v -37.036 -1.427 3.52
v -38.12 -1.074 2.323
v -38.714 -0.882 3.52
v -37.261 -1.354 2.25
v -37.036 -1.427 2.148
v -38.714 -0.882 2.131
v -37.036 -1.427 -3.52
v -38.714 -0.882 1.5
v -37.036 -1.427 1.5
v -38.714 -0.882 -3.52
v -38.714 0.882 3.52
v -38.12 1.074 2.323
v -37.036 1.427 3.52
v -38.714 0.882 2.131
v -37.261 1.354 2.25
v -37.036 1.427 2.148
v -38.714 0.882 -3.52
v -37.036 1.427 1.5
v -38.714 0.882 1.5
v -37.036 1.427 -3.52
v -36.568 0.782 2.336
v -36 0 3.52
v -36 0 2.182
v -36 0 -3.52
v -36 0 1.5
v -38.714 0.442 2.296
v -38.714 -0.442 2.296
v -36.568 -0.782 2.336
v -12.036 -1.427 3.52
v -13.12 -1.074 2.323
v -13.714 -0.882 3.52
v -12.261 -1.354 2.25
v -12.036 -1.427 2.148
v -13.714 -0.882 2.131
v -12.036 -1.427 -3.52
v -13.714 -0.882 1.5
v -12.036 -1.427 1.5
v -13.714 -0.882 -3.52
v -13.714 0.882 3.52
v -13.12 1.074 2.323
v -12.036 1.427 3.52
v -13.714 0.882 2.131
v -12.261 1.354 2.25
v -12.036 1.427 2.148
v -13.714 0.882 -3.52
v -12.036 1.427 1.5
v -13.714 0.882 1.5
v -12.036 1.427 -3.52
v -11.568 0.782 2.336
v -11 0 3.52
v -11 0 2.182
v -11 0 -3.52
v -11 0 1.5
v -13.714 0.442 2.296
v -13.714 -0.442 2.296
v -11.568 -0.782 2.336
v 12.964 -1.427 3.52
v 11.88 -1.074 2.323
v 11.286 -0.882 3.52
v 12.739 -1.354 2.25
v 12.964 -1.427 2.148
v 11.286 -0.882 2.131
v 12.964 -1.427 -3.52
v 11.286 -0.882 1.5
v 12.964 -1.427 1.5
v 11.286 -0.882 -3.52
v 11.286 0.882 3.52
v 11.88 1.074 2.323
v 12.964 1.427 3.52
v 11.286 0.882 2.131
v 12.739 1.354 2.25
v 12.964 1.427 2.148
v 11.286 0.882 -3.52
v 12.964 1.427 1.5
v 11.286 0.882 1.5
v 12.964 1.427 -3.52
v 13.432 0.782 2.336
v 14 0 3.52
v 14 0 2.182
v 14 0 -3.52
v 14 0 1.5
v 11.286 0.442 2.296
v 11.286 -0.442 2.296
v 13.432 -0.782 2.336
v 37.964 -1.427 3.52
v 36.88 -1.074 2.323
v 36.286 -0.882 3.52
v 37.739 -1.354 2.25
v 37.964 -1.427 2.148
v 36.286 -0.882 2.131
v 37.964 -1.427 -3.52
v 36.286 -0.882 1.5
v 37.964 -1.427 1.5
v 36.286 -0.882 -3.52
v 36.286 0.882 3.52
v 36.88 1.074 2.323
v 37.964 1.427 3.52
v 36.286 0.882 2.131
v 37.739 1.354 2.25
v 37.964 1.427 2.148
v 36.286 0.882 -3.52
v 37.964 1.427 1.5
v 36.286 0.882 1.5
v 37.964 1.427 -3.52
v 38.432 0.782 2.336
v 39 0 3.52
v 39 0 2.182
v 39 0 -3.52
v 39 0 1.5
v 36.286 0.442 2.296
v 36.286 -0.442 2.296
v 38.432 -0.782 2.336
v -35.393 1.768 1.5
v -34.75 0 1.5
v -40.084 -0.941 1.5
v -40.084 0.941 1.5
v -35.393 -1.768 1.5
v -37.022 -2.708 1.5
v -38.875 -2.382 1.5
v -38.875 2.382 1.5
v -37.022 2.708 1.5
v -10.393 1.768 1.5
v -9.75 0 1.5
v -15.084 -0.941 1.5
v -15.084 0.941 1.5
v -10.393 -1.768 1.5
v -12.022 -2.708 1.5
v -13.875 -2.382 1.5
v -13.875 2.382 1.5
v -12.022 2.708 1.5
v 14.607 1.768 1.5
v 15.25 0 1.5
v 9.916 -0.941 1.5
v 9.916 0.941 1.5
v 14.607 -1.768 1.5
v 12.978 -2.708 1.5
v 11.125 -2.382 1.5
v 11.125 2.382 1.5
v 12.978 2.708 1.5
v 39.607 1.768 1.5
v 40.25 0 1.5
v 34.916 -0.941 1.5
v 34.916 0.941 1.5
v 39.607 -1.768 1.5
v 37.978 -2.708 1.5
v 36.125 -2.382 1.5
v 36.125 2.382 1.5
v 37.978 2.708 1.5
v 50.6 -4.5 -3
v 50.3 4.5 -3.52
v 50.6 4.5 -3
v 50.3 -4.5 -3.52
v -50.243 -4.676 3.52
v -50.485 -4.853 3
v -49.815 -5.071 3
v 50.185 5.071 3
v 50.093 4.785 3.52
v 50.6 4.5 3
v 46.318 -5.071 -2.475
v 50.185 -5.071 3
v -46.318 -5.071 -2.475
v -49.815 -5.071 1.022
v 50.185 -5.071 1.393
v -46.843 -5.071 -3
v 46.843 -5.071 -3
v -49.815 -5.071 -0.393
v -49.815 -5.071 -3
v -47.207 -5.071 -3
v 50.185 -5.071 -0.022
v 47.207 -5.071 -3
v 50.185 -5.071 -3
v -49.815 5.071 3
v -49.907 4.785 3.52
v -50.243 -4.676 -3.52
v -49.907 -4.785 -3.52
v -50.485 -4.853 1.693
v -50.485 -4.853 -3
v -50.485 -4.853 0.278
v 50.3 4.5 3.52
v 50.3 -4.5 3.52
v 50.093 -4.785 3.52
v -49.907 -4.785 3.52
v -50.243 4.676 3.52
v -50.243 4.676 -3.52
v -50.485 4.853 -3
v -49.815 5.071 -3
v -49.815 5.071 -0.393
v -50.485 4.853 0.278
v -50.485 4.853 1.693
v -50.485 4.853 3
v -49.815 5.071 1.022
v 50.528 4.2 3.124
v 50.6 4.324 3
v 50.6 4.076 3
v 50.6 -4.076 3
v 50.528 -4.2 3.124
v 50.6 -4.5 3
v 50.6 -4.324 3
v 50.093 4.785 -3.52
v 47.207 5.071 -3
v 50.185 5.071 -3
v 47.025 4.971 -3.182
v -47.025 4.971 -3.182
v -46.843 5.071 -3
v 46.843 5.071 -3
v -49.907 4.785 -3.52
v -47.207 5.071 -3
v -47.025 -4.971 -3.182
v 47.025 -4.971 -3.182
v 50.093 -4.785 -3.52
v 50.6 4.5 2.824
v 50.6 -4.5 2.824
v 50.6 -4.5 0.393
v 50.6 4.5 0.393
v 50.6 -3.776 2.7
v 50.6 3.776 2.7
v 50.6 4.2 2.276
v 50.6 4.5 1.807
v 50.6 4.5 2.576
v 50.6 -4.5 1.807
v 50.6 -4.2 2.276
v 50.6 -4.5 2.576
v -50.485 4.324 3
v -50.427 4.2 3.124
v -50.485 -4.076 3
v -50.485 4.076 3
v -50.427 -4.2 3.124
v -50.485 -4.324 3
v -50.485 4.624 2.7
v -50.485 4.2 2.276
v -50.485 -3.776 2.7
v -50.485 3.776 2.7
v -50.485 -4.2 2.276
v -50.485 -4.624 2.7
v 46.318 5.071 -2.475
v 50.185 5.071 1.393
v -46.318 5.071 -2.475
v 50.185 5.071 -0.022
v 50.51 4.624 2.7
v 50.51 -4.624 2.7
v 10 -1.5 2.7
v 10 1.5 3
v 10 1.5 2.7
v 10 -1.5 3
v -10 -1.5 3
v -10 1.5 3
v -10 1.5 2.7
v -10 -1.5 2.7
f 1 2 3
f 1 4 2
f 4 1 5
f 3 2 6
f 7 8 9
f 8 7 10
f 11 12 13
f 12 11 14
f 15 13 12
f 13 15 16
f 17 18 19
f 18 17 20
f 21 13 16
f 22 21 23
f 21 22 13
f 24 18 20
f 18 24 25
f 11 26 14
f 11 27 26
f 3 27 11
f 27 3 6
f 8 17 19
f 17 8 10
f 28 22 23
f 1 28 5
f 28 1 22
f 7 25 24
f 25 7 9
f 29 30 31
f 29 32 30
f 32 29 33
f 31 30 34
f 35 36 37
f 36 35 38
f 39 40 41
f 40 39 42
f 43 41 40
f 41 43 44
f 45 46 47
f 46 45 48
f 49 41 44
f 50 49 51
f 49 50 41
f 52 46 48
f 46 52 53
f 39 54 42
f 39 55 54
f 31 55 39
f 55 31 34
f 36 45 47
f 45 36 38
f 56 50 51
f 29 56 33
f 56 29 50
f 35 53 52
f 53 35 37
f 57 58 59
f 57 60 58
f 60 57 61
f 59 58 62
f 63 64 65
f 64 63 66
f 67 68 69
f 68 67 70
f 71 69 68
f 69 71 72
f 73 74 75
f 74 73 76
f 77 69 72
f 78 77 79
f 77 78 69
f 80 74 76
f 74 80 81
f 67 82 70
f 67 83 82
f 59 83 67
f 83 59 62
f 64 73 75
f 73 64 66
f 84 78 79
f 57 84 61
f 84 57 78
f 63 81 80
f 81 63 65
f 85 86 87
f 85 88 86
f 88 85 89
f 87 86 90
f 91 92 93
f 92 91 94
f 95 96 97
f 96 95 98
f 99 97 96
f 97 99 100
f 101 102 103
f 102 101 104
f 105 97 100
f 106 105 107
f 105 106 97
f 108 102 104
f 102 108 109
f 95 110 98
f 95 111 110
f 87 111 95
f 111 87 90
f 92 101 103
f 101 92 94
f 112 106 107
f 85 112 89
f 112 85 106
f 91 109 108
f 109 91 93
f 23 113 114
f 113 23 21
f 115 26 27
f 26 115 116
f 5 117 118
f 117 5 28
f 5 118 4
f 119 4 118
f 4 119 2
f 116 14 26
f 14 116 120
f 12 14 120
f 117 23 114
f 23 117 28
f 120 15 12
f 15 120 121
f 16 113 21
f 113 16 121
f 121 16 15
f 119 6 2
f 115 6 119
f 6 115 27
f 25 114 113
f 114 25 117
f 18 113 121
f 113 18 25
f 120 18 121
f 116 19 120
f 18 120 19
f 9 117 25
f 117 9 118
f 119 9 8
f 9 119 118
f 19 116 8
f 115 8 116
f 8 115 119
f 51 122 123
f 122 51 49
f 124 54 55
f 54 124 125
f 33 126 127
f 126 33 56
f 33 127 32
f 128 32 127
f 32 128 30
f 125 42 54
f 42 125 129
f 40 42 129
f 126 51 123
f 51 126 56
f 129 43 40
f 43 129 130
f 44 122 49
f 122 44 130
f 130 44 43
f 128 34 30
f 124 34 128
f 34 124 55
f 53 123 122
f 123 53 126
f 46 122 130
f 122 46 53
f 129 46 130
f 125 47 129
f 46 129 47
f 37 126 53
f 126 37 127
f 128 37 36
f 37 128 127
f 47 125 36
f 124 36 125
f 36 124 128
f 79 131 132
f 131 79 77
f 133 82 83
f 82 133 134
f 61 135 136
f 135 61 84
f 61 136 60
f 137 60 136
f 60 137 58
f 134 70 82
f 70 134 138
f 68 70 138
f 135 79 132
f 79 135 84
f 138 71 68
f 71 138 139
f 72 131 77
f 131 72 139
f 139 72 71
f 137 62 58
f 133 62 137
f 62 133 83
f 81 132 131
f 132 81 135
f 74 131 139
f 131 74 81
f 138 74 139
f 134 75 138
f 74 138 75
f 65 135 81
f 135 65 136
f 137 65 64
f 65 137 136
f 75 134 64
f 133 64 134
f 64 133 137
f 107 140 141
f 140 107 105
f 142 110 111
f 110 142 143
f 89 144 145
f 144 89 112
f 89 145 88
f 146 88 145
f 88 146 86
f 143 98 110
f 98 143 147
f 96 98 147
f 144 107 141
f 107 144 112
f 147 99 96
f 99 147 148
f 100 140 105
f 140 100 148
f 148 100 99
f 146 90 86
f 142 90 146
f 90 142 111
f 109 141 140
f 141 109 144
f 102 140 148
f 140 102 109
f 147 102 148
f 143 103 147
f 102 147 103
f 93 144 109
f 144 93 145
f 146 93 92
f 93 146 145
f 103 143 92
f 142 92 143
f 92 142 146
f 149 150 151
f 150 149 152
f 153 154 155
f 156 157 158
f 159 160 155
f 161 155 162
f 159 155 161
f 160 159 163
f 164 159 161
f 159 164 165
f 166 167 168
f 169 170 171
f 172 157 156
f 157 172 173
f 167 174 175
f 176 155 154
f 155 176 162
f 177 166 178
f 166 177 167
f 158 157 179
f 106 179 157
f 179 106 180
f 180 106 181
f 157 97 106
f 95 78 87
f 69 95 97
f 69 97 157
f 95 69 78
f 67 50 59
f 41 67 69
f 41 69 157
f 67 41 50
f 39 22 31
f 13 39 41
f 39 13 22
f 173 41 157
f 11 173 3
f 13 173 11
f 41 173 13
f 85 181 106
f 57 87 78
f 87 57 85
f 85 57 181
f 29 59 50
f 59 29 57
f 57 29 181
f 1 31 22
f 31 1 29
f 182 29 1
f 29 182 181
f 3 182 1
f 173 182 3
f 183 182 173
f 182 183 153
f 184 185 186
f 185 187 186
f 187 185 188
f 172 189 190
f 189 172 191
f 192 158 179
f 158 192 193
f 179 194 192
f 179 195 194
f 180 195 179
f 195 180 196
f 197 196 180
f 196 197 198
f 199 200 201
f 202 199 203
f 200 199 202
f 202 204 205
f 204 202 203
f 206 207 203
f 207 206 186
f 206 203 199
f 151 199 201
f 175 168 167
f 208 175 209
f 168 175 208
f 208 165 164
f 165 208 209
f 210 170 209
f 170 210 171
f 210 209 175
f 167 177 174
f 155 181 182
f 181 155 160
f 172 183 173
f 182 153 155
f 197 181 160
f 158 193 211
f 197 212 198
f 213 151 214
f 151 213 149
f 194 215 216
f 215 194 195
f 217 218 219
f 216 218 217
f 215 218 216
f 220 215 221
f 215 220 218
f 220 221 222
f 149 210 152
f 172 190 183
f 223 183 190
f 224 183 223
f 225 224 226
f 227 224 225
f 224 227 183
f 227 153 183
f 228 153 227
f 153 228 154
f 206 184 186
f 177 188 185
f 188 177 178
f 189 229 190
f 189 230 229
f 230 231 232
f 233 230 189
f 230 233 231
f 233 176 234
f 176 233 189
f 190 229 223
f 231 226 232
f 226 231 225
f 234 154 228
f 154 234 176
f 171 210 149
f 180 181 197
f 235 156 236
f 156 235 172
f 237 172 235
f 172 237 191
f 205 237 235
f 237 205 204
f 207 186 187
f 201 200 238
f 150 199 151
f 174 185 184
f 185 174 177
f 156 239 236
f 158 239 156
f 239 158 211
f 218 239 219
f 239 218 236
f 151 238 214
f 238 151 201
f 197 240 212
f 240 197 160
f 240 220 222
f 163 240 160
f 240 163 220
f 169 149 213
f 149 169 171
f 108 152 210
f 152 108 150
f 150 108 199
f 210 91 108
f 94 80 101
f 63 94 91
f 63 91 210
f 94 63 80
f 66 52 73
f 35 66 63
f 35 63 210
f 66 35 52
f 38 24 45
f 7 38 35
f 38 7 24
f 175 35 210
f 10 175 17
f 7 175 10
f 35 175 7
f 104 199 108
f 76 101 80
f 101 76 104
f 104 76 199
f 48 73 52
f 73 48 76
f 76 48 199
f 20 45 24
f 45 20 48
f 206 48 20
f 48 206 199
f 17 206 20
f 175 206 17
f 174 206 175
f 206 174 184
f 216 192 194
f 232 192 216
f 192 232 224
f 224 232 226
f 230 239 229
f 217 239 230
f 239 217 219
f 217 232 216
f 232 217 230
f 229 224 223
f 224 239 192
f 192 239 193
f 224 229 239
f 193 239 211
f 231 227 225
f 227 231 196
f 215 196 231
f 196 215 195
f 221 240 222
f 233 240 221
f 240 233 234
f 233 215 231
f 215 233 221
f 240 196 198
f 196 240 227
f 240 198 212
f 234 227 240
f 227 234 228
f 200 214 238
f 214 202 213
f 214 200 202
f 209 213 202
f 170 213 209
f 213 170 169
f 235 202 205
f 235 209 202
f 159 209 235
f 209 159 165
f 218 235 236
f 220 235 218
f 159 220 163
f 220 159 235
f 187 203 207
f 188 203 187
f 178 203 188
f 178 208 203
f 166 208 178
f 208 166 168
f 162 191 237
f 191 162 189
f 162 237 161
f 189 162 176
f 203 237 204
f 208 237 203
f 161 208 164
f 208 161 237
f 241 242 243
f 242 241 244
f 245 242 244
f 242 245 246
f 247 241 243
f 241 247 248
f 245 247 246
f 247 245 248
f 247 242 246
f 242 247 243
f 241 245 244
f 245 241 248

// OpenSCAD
// Parameters
rail_L = 100.0; //[50.0:200.0:1]
rail_W = 9.0; //[4.5:18.0:0.1]
rail_H = 6.0; //[3.0:12.0:0.1]
hole_d = 3.0; //[1.5:6.0:0.1]
hole_pitch = 25.0; //[12.5:50.0:0.5]
hole_edge_offset = 12.5; //[6.0:25.0:0.5]
hole_count = 4; //[2:8:1]
csk_d = 5.5; //[3.5:11.0:0.1]
csk_angle = 90; //[60:120:1]
hole_cut_H = 8.0; //[6.0:20.0:0.5]
csk_depth = 1.5; //[0.5:3.0:0.1]
edge_chamfer = 0.6; //[0.2:1.5:0.1]
end_chamfer = 1.0; //[0.3:3.0:0.1]
fillet_r = 0.6; //[0.2:1.5:0.1]
overlap = 1.0; //[0.5:2.0:0.1]

// Base Shapes
module rail_body() {
  translate([0, 0, 0])
    cube([rail_L, rail_W, rail_H], center=true);
}

module hole_cyl(pos) {
  translate(pos)
    cylinder(h=hole_cut_H, r=hole_d/2, center=true);
}

module csk_cone(pos) {
  translate(pos)
    cylinder(h=csk_depth, r1=csk_d/2, r2=0, center=true);
}

module edge_chamfer_wedge(pos, rot) {
  translate(pos)
    rotate(rot)
      cube([rail_L + 2*overlap, edge_chamfer, edge_chamfer], center=true);
}

module end_chamfer_wedge(pos, rot) {
  translate(pos)
    rotate(rot)
      cube([end_chamfer, rail_W + 2*overlap, rail_H + 2*overlap], center=true);
}

module fillet_sphere() {
  sphere(r=fillet_r);
}

module engraved_markings() {
  translate([0, 0, rail_H/2 - rail_H/40])
    cube([rail_L/5, rail_W/3, rail_H/20], center=true);
}

// Operations
module mounting_holes_pattern() {
  union() {
    hole_cyl([-rail_L/2 + hole_edge_offset, 0, 0]);
    hole_cyl([-rail_L/2 + hole_edge_offset + hole_pitch, 0, 0]);
    hole_cyl([rail_L/2 - hole_edge_offset - hole_pitch, 0, 0]);
    hole_cyl([rail_L/2 - hole_edge_offset, 0, 0]);
    csk_cone([-rail_L/2 + hole_edge_offset, 0, rail_H/2 - csk_depth/2]);
    csk_cone([-rail_L/2 + hole_edge_offset + hole_pitch, 0, rail_H/2 - csk_depth/2]);
    csk_cone([rail_L/2 - hole_edge_offset - hole_pitch, 0, rail_H/2 - csk_depth/2]);
    csk_cone([rail_L/2 - hole_edge_offset, 0, rail_H/2 - csk_depth/2]);
  }
}

module edge_chamfers() {
  union() {
    edge_chamfer_wedge([0, rail_W/2 - edge_chamfer/2, rail_H/2 - edge_chamfer/2], [45, 0, 0]);
    edge_chamfer_wedge([0, -rail_W/2 + edge_chamfer/2, rail_H/2 - edge_chamfer/2], [-45, 0, 0]);
  }
}

module end_chamfers() {
  union() {
    end_chamfer_wedge([rail_L/2 - end_chamfer/2, 0, 0], [0, 45, 0]);
    end_chamfer_wedge([-rail_L/2 + end_chamfer/2, 0, 0], [0, -45, 0]);
  }
}

module corner_fillets() {
  minkowski() {
    rail_body();
    fillet_sphere();
  }
}

module rail_with_holes() {
  difference() {
    corner_fillets();
    mounting_holes_pattern();
  }
}

module rail_with_edge_chamfers() {
  difference() {
    rail_with_holes();
    edge_chamfers();
  }
}

module rail_with_end_chamfers() {
  difference() {
    rail_with_edge_chamfers();
    end_chamfers();
  }
}

module final_rail_model() {
  difference() {
    rail_with_end_chamfers();
    engraved_markings();
  }
}

// Final Output
final_rail_model();
